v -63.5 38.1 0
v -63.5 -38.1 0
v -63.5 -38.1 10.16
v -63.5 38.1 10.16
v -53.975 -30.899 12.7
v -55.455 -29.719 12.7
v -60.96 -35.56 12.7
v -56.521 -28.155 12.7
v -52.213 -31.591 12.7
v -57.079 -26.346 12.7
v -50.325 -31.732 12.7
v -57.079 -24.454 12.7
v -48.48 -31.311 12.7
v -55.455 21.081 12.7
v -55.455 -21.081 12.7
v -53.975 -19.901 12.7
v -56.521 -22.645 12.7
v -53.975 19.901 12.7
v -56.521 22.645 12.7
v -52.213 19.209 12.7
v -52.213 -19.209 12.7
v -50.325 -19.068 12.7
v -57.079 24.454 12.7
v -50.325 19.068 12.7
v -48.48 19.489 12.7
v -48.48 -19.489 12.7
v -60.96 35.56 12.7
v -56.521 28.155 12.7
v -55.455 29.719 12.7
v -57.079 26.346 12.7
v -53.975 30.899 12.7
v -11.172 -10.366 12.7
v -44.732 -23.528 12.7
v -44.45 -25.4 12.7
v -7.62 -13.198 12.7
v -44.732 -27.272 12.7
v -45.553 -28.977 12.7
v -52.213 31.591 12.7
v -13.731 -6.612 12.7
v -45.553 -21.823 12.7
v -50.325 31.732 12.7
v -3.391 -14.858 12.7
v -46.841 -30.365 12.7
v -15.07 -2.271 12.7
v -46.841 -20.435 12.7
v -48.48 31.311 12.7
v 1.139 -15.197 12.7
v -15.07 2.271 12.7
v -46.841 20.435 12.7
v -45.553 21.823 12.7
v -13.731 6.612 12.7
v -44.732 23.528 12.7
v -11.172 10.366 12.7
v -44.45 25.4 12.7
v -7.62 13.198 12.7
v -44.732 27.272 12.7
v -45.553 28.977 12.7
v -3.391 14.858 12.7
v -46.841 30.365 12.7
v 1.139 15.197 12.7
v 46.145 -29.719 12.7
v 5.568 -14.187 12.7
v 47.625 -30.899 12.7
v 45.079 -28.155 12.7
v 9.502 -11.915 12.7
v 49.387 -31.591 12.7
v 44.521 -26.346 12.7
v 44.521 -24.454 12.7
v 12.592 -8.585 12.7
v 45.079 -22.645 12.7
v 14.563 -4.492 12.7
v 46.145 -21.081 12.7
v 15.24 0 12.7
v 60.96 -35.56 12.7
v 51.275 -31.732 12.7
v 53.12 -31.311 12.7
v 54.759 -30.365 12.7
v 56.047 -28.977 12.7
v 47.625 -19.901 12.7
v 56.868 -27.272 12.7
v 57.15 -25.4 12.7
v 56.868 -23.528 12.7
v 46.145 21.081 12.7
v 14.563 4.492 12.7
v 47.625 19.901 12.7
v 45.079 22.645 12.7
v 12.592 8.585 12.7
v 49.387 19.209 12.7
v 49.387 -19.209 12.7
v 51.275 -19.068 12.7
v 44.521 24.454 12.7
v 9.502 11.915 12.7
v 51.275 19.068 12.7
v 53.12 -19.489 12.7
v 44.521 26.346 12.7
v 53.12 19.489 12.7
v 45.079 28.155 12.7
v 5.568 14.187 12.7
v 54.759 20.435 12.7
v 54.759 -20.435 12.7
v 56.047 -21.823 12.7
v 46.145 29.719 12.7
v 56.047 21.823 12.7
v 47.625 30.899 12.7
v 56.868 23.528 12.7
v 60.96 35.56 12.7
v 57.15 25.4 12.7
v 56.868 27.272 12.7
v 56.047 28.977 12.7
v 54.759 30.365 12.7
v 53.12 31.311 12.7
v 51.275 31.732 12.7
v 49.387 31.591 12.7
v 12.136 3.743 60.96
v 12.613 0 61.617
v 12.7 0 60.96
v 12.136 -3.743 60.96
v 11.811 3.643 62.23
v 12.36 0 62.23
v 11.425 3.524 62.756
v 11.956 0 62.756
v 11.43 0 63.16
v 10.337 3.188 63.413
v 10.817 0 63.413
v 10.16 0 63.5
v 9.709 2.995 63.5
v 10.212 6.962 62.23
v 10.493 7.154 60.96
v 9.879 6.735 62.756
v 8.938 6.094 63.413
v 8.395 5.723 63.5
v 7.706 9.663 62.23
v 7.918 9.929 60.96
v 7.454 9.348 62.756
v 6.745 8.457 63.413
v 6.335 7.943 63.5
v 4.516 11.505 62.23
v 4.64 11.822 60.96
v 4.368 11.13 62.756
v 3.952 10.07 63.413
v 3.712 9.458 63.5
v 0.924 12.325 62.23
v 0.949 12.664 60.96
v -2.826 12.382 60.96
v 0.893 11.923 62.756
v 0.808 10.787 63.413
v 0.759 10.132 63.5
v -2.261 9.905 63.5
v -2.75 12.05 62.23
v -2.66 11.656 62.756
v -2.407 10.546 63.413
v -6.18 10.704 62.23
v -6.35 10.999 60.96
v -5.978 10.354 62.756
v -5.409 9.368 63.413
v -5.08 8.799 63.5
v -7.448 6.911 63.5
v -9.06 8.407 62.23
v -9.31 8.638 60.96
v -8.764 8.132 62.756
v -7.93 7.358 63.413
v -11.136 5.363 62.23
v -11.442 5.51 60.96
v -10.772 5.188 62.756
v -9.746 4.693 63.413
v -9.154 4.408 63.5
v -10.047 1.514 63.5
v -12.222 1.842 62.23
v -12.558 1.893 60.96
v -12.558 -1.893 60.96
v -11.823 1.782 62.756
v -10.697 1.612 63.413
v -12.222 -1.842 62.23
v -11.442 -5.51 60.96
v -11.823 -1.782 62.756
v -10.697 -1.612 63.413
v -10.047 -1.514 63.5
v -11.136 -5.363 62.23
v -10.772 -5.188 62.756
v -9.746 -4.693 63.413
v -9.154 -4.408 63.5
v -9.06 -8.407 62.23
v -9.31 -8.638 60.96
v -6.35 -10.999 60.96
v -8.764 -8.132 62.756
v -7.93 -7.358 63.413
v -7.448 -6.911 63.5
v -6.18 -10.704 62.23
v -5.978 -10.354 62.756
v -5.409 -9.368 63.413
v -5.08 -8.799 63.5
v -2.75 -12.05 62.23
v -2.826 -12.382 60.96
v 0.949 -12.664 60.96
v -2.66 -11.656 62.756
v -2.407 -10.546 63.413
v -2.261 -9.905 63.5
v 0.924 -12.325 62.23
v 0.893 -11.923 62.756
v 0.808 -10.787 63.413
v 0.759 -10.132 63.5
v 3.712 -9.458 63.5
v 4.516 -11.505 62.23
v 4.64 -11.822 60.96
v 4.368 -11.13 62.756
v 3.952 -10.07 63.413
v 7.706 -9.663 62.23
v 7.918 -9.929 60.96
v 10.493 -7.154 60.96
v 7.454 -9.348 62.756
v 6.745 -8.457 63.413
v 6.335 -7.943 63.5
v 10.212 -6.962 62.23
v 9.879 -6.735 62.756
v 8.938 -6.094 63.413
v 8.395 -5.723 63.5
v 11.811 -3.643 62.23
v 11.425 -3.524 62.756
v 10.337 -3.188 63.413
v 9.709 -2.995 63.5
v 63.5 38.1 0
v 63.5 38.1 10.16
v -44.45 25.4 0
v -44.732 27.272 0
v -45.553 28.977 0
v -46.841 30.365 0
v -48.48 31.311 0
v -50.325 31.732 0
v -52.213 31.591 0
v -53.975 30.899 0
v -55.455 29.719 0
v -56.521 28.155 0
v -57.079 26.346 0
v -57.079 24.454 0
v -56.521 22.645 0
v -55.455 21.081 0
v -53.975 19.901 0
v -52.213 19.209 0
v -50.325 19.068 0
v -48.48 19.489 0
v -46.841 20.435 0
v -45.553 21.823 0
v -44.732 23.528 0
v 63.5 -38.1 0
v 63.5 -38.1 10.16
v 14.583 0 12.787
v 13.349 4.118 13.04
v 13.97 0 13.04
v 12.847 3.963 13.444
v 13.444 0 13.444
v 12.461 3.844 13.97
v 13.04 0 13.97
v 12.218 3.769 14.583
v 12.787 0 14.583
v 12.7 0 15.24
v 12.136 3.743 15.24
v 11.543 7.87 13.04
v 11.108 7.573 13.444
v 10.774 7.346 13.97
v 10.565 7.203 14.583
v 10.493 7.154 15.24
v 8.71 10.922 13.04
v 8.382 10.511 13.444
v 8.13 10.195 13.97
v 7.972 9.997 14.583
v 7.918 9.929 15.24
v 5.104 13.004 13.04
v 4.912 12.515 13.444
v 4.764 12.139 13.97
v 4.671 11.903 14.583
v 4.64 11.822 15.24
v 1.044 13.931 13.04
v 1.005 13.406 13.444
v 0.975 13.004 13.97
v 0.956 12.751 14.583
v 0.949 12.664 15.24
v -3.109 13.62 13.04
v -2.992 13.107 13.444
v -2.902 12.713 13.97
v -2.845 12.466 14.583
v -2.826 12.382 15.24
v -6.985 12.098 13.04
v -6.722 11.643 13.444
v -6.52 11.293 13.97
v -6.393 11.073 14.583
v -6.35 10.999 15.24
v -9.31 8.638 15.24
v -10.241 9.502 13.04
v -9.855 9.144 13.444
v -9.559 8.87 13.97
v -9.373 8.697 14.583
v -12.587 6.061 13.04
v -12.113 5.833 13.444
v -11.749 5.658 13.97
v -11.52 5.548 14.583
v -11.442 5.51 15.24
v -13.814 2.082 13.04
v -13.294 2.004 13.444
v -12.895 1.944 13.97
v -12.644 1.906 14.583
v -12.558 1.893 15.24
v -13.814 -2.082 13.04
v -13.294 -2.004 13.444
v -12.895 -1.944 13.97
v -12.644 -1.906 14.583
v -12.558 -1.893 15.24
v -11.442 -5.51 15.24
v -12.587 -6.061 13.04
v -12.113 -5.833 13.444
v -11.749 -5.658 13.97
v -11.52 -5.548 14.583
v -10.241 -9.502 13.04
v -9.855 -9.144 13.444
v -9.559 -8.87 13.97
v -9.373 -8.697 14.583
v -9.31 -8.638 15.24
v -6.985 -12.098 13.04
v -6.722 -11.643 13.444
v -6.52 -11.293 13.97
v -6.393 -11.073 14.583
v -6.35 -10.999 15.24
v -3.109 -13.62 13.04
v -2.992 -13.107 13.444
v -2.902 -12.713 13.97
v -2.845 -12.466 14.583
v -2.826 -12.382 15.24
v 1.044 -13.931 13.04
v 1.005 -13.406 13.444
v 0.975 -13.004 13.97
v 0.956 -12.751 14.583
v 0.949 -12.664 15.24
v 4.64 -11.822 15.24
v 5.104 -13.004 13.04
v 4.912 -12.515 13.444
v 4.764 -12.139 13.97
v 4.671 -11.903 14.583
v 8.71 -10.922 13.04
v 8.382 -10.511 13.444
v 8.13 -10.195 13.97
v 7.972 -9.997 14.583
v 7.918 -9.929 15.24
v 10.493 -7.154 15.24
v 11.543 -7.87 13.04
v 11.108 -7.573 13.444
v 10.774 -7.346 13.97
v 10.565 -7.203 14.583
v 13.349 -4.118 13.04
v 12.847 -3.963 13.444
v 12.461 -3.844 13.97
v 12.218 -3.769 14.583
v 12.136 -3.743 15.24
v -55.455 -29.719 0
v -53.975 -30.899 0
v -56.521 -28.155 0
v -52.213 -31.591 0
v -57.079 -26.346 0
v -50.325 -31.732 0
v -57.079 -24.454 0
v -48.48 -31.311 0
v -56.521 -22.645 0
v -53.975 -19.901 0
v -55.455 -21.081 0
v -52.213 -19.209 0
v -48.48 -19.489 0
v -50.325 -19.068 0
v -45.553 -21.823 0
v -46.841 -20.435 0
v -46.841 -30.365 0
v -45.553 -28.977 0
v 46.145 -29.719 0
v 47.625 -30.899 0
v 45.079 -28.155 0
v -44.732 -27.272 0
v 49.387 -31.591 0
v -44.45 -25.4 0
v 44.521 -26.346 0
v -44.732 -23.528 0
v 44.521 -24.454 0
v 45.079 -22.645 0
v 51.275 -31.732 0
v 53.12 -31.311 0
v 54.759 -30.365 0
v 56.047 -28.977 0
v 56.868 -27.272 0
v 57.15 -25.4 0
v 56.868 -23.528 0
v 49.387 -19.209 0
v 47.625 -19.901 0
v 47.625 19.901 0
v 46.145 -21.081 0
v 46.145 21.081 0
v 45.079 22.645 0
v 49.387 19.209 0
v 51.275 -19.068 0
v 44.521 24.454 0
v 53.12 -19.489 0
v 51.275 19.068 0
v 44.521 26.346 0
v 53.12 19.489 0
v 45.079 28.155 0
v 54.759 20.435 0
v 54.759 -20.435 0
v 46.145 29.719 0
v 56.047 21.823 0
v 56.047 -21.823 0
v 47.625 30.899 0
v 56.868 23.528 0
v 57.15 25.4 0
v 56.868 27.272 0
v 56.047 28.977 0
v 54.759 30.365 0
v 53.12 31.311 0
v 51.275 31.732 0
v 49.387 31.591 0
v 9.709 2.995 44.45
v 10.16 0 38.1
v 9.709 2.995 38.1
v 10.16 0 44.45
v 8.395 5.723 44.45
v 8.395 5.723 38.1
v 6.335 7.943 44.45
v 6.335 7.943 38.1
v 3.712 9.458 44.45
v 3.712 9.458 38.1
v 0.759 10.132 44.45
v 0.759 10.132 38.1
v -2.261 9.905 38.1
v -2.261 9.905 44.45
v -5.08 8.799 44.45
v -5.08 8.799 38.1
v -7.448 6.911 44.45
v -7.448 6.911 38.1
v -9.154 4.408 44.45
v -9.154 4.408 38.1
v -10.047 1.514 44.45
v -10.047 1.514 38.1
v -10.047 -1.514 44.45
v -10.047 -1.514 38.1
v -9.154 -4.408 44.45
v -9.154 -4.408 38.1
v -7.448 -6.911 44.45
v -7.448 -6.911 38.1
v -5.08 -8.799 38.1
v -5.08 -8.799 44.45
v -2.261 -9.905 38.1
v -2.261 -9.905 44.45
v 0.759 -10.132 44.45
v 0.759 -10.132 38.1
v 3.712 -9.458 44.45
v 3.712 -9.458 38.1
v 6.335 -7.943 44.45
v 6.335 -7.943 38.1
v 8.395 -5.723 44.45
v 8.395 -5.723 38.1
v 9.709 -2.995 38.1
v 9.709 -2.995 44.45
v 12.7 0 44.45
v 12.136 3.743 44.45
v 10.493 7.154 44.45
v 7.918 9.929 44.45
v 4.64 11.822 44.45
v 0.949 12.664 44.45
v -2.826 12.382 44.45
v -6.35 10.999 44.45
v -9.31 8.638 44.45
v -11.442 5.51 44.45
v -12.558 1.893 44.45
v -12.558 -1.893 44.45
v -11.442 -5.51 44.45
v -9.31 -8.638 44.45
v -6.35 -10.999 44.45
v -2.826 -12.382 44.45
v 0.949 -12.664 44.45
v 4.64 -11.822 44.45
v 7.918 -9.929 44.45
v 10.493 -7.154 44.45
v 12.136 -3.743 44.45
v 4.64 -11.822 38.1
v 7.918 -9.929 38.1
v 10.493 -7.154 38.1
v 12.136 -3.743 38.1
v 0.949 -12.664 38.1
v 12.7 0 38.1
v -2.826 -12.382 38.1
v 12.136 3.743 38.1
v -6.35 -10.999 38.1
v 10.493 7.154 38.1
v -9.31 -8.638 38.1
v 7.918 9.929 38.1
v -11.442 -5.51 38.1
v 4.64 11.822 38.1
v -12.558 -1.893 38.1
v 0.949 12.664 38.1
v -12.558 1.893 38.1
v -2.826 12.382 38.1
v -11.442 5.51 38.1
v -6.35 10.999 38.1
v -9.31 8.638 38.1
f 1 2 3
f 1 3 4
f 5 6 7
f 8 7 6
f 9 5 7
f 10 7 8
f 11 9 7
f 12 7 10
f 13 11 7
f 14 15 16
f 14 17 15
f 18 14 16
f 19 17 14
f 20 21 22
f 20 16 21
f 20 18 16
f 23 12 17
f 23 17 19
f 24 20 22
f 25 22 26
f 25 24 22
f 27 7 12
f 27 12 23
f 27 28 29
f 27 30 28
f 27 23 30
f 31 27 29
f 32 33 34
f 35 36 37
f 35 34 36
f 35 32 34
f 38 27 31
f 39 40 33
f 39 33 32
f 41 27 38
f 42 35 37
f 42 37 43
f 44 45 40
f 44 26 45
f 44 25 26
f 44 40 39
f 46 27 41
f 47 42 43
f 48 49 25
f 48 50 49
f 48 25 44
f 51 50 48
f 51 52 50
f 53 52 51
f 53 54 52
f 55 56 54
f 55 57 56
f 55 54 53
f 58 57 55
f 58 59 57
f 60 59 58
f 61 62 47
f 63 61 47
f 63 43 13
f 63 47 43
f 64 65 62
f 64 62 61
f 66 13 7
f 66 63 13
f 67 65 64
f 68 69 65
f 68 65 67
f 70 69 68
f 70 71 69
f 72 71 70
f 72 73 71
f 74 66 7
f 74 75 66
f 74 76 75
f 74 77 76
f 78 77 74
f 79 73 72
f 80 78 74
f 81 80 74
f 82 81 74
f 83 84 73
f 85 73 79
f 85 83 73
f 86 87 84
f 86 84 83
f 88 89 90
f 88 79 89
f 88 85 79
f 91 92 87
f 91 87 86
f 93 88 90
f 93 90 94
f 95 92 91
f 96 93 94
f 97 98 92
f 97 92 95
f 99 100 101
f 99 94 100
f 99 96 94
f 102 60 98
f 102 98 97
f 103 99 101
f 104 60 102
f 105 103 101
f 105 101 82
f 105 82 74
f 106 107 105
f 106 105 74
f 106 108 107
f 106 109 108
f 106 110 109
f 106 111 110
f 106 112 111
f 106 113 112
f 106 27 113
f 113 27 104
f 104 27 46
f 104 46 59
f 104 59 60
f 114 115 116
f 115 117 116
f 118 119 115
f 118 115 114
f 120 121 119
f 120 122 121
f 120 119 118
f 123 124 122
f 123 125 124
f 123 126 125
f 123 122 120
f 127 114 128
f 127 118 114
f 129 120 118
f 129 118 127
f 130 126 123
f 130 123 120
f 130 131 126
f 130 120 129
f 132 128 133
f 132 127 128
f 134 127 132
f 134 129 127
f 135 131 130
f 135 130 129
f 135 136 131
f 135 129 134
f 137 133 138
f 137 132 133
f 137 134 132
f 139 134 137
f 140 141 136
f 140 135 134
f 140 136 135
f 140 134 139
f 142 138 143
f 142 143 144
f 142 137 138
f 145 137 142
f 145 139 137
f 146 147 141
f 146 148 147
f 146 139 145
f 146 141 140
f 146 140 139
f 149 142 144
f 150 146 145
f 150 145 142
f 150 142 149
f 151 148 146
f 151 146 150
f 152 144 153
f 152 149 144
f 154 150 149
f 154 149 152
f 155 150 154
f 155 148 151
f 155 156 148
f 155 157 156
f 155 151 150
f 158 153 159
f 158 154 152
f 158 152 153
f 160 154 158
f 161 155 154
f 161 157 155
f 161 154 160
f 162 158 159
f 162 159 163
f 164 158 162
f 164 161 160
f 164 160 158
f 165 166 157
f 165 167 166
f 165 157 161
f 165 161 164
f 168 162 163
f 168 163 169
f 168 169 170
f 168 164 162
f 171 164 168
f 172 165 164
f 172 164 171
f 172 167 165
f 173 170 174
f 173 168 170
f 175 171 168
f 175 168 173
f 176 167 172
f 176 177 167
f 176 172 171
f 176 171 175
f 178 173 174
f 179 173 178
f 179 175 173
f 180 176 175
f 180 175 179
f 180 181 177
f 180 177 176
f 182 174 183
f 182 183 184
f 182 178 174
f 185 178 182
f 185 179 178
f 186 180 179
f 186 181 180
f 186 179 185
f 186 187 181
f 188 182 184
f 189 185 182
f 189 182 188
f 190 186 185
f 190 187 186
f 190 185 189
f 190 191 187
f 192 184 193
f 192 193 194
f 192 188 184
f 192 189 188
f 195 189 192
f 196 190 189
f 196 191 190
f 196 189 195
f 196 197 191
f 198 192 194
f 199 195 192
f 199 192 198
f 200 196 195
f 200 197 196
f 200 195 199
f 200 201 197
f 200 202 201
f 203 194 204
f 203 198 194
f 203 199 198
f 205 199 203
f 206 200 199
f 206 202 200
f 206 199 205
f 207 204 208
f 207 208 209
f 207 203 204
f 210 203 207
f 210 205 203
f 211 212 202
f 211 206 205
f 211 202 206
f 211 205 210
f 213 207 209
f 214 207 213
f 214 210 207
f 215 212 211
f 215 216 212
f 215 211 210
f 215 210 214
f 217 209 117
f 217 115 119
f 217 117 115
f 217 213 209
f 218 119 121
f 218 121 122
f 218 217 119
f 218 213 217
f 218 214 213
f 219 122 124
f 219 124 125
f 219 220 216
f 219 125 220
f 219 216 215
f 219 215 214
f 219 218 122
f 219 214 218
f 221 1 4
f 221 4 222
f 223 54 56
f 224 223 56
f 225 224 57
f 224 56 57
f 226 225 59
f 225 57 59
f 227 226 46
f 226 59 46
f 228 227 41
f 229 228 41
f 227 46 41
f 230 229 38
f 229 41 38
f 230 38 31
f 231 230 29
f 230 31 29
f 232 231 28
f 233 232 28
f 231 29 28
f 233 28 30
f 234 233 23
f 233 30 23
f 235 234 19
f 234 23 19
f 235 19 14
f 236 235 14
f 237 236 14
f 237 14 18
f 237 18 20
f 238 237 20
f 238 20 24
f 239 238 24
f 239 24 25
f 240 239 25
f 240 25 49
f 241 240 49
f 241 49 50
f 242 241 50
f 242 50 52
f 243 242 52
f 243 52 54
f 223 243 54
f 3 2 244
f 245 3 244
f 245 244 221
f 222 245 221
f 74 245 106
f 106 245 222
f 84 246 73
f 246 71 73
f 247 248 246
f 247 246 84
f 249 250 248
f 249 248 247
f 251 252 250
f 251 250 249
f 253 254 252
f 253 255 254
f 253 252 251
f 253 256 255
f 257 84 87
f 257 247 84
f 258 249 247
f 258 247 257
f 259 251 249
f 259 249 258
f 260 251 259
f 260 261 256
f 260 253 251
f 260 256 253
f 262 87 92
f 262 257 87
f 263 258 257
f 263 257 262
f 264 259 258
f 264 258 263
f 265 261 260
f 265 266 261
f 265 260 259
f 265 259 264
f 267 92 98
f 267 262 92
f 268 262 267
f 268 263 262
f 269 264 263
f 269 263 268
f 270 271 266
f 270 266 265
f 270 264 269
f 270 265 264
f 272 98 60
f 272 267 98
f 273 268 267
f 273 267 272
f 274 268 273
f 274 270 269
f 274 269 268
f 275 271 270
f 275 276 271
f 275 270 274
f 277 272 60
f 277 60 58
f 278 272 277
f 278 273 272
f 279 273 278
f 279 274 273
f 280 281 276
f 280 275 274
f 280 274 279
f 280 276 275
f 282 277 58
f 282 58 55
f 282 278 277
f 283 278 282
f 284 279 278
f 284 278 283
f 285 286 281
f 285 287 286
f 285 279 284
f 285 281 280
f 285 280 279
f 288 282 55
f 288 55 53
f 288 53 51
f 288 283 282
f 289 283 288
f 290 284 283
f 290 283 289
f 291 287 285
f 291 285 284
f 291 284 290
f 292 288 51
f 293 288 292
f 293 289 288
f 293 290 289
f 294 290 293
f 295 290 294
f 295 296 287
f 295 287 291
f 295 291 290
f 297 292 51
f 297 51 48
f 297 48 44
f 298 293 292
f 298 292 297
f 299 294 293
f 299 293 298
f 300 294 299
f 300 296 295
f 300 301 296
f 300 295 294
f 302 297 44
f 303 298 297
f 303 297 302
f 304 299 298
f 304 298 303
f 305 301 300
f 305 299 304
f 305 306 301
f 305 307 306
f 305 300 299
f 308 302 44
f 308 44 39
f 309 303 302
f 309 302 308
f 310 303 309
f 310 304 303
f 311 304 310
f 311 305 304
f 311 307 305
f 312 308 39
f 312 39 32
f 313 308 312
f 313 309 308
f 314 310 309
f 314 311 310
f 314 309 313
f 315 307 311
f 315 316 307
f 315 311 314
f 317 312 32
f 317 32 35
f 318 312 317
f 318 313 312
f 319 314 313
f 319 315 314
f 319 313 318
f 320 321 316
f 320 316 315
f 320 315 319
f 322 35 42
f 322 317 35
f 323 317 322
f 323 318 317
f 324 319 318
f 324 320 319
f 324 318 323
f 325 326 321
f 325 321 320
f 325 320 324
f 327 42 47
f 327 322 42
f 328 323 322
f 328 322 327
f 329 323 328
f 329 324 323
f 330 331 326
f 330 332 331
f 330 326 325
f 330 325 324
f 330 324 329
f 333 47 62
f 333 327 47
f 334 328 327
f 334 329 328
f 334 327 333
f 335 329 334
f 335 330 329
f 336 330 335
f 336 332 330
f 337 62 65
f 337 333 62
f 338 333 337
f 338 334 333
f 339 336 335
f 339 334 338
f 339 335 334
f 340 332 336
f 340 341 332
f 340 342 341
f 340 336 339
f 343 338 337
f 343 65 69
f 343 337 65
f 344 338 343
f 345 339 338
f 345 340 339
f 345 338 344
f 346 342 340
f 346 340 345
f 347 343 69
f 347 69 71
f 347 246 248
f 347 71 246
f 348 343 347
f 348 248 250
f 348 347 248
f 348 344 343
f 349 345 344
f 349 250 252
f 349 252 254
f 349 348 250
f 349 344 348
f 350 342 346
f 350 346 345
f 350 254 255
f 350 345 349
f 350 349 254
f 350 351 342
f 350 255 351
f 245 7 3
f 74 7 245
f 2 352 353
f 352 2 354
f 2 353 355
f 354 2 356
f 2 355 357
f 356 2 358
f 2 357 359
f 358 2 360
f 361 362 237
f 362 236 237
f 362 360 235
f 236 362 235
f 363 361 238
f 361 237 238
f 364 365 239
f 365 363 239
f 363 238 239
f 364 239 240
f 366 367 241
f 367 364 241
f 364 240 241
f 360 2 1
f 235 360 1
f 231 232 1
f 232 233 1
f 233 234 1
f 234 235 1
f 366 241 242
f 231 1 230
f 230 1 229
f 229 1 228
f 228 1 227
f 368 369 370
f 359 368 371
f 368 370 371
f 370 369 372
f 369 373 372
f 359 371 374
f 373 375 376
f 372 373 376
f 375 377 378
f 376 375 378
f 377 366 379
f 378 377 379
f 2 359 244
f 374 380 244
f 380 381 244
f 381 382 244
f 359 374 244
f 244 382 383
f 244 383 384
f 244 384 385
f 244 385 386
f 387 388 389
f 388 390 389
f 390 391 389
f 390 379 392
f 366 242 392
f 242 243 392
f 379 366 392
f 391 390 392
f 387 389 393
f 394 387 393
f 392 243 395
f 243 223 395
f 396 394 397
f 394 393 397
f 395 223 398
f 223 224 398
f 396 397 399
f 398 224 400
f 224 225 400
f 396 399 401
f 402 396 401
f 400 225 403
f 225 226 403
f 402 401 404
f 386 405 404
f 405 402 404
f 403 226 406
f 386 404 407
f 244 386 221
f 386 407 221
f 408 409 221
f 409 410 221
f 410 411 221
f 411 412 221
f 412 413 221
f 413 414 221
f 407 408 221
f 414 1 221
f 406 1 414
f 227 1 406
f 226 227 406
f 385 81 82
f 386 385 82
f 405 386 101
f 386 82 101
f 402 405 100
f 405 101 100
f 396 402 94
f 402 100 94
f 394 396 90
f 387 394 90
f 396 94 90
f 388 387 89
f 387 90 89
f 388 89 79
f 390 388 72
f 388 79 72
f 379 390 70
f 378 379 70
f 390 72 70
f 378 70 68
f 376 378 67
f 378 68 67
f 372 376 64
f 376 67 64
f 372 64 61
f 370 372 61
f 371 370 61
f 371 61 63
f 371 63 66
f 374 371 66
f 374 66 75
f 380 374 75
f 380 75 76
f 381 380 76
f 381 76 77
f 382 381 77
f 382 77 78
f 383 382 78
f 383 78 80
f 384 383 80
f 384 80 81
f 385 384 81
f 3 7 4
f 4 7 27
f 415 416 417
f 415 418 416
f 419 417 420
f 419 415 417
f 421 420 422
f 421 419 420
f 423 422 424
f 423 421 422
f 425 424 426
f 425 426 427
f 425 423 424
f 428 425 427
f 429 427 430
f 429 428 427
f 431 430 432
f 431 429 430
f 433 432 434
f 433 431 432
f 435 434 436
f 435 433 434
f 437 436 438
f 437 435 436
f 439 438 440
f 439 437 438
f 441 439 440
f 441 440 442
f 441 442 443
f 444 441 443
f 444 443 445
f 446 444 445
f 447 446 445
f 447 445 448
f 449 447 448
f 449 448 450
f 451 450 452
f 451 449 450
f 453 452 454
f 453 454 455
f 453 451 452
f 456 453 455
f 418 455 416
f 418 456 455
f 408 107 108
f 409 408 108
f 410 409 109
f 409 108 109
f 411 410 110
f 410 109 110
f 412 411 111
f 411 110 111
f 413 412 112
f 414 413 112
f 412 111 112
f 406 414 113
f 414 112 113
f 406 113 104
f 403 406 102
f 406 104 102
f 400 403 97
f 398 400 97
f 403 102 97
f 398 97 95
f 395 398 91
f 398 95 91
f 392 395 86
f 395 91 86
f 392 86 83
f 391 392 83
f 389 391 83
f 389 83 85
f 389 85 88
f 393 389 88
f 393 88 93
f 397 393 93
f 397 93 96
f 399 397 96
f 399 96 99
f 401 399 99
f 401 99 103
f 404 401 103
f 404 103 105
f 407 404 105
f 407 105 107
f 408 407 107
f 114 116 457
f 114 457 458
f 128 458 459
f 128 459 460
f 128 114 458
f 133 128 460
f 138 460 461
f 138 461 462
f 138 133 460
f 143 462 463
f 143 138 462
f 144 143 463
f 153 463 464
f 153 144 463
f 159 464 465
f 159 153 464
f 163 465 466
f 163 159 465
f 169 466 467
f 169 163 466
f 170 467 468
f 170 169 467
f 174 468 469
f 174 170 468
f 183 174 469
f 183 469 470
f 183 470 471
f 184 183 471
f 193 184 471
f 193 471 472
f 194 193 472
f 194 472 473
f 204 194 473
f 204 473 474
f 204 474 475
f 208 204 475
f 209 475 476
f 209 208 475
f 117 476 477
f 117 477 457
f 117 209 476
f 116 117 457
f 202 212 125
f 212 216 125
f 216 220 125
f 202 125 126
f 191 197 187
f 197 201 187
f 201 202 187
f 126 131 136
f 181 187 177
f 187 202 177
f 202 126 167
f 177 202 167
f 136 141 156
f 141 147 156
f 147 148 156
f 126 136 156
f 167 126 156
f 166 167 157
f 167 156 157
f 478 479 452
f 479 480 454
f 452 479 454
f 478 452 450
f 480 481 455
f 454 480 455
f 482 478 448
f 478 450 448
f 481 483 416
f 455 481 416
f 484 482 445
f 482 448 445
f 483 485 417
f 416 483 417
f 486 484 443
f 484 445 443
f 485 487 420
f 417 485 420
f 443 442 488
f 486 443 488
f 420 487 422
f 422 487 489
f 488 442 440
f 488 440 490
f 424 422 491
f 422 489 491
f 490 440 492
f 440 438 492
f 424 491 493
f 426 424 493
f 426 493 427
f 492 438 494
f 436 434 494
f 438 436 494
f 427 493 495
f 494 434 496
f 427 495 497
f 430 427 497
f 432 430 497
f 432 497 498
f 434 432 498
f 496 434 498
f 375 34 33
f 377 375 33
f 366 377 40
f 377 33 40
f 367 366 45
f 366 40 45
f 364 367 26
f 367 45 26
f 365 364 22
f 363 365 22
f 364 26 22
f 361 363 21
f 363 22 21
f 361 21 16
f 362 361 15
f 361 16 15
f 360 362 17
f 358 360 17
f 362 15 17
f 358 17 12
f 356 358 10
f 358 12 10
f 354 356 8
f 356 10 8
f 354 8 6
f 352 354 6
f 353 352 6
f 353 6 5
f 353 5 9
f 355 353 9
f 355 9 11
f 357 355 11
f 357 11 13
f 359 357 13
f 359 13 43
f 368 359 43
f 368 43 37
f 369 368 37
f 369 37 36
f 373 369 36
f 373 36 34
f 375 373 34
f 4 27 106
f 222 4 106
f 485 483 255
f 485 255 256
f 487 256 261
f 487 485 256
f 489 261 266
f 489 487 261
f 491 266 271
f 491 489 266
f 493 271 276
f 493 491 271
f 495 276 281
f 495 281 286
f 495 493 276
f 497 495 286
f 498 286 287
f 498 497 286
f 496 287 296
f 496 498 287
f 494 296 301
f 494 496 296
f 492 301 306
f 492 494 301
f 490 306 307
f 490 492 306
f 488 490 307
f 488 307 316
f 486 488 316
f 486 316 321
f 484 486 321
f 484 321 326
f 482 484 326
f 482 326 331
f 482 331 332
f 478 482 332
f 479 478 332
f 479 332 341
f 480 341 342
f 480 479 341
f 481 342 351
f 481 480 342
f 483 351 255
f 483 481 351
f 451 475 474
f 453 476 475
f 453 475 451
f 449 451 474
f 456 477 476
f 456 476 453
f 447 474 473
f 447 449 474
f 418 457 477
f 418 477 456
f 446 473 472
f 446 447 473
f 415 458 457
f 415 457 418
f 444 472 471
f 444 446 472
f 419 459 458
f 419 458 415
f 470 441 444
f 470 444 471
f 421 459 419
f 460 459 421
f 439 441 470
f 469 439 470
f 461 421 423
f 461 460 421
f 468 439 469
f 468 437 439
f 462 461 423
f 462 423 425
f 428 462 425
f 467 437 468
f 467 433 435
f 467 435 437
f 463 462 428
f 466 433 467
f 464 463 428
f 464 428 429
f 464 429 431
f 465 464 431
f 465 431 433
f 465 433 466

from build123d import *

# Parameters (mm, degrees)
F0_W     = 127
F0_H     = 76.2
F1_DEPTH = 12.7
F2_R     = 6.35
F3_DEPTH = 12.701
F4_W     = 12.7
F4_H     = 50.8
F6_W     = 15.515666
F6_H     = 6.35
F8_SIZE  = 2.54
F9_R     = 2.54


with BuildPart() as f1:
    # F0 (on Top) → F1 (new body)
    with BuildSketch(Plane.XY):
        Rectangle(F0_W, F0_H)
    extrude(amount=F1_DEPTH)

    # F2 (on face) → F3 (cut, through all)
    with BuildSketch(Plane.XY.offset(12.7)):
        with Locations((-50.8, -25.4)):
            Circle(F2_R)
        with Locations((50.8, 25.4)):
            Circle(F2_R)
        with Locations((50.8, -25.4)):
            Circle(F2_R)
        with Locations((-50.8, 25.4)):
            Circle(F2_R)
    extrude(amount=-F3_DEPTH, mode=Mode.SUBTRACT)

    # F4 (on Front) → F5 (revolve)
    with BuildSketch(Plane.XZ):
        with Locations((6.35, 38.1)):
            Rectangle(F4_W, F4_H)
    revolve(axis=Axis((0, 0, 38.1), (0, 0, 1)))

    # F6 (on Front) → F7 (revolve, cut)
    with BuildSketch(Plane.XZ):
        with Locations((17.917833, 41.275)):
            Rectangle(F6_W, F6_H)
    revolve(axis=Axis((0, 0, 12.7), (0, 0, 1)), mode=Mode.SUBTRACT)

    # F8
    f8_edges = [f1.edges().sort_by_distance(p)[0] for p in [
        (0, -38.1, 12.7),
        (63.5, 0, 12.7),
        (0, 38.1, 12.7),
        (-63.5, 0, 12.7),
    ]]
    chamfer(f8_edges, length=F8_SIZE)

    # F9
    f9_edges = [f1.edges().sort_by_distance(p)[0] for p in [
        (-12.7, 0, 12.7),
        (-12.7, 0, 63.5),
    ]]
    fillet(f9_edges, radius=F9_R)


solid = f1.part
